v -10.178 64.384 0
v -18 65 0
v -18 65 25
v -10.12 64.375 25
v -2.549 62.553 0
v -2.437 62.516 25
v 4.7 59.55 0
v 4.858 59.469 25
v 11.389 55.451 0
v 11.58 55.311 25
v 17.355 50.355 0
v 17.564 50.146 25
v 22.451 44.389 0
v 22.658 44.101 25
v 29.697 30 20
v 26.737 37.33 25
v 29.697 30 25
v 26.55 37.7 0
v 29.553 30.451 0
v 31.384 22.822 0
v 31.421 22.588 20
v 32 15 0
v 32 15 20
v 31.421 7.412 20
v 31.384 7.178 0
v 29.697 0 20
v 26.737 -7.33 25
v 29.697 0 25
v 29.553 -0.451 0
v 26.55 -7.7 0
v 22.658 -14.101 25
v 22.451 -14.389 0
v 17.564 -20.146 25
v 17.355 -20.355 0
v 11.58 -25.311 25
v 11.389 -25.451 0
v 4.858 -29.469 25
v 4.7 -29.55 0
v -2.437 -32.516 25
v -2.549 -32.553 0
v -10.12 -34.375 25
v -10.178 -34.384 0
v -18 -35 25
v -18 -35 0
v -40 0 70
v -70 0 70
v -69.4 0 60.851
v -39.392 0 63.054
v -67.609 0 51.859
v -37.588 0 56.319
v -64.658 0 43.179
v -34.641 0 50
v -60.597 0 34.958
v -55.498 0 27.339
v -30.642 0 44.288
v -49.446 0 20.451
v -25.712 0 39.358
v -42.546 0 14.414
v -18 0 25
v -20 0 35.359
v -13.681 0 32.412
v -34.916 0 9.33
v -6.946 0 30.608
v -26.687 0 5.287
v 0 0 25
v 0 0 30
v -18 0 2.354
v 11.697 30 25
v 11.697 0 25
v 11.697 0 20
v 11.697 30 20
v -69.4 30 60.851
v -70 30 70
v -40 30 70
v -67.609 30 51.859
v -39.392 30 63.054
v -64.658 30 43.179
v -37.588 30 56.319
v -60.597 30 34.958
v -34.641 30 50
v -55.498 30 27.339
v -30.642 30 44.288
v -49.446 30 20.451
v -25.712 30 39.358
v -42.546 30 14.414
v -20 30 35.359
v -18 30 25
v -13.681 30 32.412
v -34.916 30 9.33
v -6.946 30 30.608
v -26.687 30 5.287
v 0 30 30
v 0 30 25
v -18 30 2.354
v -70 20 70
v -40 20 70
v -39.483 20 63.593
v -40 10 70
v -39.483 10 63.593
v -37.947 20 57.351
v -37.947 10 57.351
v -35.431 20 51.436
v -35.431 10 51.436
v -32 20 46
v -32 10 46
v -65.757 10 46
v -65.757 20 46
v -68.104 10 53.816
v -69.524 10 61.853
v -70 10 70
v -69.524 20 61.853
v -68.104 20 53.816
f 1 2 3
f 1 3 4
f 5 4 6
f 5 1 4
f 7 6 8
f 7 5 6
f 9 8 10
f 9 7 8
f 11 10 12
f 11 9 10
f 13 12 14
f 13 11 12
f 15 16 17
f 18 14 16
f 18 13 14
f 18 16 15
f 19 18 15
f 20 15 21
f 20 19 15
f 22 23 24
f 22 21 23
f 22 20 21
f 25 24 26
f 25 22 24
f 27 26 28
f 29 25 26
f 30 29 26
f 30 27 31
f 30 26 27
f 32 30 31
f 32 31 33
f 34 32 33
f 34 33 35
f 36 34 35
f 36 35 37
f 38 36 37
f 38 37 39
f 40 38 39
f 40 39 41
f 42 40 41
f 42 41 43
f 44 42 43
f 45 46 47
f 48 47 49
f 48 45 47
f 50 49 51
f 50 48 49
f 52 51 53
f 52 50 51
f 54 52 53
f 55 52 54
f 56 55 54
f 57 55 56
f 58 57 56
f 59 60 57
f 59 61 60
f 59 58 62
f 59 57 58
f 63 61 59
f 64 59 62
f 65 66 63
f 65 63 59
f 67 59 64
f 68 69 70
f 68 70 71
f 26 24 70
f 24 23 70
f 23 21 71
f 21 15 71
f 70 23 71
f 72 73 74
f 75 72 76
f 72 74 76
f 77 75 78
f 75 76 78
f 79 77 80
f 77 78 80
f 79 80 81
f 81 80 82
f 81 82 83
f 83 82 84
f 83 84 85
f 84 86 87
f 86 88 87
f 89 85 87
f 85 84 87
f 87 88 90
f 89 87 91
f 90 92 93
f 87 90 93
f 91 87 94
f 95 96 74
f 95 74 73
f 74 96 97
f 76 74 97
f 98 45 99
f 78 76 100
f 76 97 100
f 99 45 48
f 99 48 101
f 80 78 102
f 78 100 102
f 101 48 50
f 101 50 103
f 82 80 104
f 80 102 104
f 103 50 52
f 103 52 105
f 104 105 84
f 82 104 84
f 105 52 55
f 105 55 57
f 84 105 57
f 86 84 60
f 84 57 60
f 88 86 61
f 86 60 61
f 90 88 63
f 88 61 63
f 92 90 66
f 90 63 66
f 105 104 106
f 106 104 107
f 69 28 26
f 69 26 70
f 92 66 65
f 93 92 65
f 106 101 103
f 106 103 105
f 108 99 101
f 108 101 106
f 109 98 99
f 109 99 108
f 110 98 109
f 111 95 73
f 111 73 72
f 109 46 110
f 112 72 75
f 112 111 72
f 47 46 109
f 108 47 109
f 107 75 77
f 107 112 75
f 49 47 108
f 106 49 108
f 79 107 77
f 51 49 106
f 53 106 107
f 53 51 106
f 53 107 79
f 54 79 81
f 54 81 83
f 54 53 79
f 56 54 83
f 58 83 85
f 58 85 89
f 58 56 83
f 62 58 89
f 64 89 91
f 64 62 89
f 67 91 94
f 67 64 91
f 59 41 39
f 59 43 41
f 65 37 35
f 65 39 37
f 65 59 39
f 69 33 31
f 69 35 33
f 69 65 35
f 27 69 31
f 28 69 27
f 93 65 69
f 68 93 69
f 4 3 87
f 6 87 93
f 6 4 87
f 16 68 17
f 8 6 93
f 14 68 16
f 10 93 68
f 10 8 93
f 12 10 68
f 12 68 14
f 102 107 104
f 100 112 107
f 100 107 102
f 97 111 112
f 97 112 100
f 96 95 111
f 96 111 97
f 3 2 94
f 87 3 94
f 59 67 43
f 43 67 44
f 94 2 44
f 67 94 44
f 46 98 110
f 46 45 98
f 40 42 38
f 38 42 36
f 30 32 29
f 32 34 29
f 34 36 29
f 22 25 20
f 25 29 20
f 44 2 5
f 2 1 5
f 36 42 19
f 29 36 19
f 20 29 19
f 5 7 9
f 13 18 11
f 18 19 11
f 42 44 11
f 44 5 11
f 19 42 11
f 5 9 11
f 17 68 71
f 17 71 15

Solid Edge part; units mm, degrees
sketch "Sketch1" plane through (0, 0, 0) normal (0, -1, 0) x (1, 0, 0)
  line L0 (-40, 70) -> (-70, 70)
  arc A0 (-70, 70) -> (0, 0) centre (0, 70) ccw
  line L1 (0, 30) -> (0, 0)
  arc A1 (-40, 70) -> (0, 30) centre (0, 70) ccw
extrude "Protrusion1" add sketch "Sketch1" against normal blind 30
sketch "Sketch2" plane through (-27.4086, 15, 70) normal (0, 0, 1) x (1, 0, 0)
  line L0 (7.4086, -5) -> (-42.5914, -5)
  line L1 (-42.5914, -5) -> (-42.5914, 5)
  line L2 (-42.5914, 5) -> (7.4086, 5)
  line L3 (7.4086, 5) -> (7.4086, -5)
extrude "ExtrudedCutout_4" cut sketch "Sketch2" against normal blind 24
sketch "Sketch3" plane through (0, 0, 0) normal (0, 0, 1) x (1, 0, 0)
  line L0 (-18, 65) -> (-18, -35)
  arc A0 (-18, 65) -> (-18, -35) centre (-18, 15) cw
extrude "ExtrudedProtrusion_2" add sketch "Sketch3" along normal blind 25
sketch "Sketch4" plane through (7, 15, 25) normal (0, 0, 1) x (0, 1, 0)
  line L0 (-15, -4.697) -> (15, -4.697)
  line L1 (15, -4.697) -> (15, -22.697)
  arc A0 (-15, -22.697) -> (15, -22.697) centre (0, 25) ccw
  line L2 (-15, -22.697) -> (-15, -4.697)
extrude "ExtrudedCutout_5" cut sketch "Sketch4" against normal blind 5
